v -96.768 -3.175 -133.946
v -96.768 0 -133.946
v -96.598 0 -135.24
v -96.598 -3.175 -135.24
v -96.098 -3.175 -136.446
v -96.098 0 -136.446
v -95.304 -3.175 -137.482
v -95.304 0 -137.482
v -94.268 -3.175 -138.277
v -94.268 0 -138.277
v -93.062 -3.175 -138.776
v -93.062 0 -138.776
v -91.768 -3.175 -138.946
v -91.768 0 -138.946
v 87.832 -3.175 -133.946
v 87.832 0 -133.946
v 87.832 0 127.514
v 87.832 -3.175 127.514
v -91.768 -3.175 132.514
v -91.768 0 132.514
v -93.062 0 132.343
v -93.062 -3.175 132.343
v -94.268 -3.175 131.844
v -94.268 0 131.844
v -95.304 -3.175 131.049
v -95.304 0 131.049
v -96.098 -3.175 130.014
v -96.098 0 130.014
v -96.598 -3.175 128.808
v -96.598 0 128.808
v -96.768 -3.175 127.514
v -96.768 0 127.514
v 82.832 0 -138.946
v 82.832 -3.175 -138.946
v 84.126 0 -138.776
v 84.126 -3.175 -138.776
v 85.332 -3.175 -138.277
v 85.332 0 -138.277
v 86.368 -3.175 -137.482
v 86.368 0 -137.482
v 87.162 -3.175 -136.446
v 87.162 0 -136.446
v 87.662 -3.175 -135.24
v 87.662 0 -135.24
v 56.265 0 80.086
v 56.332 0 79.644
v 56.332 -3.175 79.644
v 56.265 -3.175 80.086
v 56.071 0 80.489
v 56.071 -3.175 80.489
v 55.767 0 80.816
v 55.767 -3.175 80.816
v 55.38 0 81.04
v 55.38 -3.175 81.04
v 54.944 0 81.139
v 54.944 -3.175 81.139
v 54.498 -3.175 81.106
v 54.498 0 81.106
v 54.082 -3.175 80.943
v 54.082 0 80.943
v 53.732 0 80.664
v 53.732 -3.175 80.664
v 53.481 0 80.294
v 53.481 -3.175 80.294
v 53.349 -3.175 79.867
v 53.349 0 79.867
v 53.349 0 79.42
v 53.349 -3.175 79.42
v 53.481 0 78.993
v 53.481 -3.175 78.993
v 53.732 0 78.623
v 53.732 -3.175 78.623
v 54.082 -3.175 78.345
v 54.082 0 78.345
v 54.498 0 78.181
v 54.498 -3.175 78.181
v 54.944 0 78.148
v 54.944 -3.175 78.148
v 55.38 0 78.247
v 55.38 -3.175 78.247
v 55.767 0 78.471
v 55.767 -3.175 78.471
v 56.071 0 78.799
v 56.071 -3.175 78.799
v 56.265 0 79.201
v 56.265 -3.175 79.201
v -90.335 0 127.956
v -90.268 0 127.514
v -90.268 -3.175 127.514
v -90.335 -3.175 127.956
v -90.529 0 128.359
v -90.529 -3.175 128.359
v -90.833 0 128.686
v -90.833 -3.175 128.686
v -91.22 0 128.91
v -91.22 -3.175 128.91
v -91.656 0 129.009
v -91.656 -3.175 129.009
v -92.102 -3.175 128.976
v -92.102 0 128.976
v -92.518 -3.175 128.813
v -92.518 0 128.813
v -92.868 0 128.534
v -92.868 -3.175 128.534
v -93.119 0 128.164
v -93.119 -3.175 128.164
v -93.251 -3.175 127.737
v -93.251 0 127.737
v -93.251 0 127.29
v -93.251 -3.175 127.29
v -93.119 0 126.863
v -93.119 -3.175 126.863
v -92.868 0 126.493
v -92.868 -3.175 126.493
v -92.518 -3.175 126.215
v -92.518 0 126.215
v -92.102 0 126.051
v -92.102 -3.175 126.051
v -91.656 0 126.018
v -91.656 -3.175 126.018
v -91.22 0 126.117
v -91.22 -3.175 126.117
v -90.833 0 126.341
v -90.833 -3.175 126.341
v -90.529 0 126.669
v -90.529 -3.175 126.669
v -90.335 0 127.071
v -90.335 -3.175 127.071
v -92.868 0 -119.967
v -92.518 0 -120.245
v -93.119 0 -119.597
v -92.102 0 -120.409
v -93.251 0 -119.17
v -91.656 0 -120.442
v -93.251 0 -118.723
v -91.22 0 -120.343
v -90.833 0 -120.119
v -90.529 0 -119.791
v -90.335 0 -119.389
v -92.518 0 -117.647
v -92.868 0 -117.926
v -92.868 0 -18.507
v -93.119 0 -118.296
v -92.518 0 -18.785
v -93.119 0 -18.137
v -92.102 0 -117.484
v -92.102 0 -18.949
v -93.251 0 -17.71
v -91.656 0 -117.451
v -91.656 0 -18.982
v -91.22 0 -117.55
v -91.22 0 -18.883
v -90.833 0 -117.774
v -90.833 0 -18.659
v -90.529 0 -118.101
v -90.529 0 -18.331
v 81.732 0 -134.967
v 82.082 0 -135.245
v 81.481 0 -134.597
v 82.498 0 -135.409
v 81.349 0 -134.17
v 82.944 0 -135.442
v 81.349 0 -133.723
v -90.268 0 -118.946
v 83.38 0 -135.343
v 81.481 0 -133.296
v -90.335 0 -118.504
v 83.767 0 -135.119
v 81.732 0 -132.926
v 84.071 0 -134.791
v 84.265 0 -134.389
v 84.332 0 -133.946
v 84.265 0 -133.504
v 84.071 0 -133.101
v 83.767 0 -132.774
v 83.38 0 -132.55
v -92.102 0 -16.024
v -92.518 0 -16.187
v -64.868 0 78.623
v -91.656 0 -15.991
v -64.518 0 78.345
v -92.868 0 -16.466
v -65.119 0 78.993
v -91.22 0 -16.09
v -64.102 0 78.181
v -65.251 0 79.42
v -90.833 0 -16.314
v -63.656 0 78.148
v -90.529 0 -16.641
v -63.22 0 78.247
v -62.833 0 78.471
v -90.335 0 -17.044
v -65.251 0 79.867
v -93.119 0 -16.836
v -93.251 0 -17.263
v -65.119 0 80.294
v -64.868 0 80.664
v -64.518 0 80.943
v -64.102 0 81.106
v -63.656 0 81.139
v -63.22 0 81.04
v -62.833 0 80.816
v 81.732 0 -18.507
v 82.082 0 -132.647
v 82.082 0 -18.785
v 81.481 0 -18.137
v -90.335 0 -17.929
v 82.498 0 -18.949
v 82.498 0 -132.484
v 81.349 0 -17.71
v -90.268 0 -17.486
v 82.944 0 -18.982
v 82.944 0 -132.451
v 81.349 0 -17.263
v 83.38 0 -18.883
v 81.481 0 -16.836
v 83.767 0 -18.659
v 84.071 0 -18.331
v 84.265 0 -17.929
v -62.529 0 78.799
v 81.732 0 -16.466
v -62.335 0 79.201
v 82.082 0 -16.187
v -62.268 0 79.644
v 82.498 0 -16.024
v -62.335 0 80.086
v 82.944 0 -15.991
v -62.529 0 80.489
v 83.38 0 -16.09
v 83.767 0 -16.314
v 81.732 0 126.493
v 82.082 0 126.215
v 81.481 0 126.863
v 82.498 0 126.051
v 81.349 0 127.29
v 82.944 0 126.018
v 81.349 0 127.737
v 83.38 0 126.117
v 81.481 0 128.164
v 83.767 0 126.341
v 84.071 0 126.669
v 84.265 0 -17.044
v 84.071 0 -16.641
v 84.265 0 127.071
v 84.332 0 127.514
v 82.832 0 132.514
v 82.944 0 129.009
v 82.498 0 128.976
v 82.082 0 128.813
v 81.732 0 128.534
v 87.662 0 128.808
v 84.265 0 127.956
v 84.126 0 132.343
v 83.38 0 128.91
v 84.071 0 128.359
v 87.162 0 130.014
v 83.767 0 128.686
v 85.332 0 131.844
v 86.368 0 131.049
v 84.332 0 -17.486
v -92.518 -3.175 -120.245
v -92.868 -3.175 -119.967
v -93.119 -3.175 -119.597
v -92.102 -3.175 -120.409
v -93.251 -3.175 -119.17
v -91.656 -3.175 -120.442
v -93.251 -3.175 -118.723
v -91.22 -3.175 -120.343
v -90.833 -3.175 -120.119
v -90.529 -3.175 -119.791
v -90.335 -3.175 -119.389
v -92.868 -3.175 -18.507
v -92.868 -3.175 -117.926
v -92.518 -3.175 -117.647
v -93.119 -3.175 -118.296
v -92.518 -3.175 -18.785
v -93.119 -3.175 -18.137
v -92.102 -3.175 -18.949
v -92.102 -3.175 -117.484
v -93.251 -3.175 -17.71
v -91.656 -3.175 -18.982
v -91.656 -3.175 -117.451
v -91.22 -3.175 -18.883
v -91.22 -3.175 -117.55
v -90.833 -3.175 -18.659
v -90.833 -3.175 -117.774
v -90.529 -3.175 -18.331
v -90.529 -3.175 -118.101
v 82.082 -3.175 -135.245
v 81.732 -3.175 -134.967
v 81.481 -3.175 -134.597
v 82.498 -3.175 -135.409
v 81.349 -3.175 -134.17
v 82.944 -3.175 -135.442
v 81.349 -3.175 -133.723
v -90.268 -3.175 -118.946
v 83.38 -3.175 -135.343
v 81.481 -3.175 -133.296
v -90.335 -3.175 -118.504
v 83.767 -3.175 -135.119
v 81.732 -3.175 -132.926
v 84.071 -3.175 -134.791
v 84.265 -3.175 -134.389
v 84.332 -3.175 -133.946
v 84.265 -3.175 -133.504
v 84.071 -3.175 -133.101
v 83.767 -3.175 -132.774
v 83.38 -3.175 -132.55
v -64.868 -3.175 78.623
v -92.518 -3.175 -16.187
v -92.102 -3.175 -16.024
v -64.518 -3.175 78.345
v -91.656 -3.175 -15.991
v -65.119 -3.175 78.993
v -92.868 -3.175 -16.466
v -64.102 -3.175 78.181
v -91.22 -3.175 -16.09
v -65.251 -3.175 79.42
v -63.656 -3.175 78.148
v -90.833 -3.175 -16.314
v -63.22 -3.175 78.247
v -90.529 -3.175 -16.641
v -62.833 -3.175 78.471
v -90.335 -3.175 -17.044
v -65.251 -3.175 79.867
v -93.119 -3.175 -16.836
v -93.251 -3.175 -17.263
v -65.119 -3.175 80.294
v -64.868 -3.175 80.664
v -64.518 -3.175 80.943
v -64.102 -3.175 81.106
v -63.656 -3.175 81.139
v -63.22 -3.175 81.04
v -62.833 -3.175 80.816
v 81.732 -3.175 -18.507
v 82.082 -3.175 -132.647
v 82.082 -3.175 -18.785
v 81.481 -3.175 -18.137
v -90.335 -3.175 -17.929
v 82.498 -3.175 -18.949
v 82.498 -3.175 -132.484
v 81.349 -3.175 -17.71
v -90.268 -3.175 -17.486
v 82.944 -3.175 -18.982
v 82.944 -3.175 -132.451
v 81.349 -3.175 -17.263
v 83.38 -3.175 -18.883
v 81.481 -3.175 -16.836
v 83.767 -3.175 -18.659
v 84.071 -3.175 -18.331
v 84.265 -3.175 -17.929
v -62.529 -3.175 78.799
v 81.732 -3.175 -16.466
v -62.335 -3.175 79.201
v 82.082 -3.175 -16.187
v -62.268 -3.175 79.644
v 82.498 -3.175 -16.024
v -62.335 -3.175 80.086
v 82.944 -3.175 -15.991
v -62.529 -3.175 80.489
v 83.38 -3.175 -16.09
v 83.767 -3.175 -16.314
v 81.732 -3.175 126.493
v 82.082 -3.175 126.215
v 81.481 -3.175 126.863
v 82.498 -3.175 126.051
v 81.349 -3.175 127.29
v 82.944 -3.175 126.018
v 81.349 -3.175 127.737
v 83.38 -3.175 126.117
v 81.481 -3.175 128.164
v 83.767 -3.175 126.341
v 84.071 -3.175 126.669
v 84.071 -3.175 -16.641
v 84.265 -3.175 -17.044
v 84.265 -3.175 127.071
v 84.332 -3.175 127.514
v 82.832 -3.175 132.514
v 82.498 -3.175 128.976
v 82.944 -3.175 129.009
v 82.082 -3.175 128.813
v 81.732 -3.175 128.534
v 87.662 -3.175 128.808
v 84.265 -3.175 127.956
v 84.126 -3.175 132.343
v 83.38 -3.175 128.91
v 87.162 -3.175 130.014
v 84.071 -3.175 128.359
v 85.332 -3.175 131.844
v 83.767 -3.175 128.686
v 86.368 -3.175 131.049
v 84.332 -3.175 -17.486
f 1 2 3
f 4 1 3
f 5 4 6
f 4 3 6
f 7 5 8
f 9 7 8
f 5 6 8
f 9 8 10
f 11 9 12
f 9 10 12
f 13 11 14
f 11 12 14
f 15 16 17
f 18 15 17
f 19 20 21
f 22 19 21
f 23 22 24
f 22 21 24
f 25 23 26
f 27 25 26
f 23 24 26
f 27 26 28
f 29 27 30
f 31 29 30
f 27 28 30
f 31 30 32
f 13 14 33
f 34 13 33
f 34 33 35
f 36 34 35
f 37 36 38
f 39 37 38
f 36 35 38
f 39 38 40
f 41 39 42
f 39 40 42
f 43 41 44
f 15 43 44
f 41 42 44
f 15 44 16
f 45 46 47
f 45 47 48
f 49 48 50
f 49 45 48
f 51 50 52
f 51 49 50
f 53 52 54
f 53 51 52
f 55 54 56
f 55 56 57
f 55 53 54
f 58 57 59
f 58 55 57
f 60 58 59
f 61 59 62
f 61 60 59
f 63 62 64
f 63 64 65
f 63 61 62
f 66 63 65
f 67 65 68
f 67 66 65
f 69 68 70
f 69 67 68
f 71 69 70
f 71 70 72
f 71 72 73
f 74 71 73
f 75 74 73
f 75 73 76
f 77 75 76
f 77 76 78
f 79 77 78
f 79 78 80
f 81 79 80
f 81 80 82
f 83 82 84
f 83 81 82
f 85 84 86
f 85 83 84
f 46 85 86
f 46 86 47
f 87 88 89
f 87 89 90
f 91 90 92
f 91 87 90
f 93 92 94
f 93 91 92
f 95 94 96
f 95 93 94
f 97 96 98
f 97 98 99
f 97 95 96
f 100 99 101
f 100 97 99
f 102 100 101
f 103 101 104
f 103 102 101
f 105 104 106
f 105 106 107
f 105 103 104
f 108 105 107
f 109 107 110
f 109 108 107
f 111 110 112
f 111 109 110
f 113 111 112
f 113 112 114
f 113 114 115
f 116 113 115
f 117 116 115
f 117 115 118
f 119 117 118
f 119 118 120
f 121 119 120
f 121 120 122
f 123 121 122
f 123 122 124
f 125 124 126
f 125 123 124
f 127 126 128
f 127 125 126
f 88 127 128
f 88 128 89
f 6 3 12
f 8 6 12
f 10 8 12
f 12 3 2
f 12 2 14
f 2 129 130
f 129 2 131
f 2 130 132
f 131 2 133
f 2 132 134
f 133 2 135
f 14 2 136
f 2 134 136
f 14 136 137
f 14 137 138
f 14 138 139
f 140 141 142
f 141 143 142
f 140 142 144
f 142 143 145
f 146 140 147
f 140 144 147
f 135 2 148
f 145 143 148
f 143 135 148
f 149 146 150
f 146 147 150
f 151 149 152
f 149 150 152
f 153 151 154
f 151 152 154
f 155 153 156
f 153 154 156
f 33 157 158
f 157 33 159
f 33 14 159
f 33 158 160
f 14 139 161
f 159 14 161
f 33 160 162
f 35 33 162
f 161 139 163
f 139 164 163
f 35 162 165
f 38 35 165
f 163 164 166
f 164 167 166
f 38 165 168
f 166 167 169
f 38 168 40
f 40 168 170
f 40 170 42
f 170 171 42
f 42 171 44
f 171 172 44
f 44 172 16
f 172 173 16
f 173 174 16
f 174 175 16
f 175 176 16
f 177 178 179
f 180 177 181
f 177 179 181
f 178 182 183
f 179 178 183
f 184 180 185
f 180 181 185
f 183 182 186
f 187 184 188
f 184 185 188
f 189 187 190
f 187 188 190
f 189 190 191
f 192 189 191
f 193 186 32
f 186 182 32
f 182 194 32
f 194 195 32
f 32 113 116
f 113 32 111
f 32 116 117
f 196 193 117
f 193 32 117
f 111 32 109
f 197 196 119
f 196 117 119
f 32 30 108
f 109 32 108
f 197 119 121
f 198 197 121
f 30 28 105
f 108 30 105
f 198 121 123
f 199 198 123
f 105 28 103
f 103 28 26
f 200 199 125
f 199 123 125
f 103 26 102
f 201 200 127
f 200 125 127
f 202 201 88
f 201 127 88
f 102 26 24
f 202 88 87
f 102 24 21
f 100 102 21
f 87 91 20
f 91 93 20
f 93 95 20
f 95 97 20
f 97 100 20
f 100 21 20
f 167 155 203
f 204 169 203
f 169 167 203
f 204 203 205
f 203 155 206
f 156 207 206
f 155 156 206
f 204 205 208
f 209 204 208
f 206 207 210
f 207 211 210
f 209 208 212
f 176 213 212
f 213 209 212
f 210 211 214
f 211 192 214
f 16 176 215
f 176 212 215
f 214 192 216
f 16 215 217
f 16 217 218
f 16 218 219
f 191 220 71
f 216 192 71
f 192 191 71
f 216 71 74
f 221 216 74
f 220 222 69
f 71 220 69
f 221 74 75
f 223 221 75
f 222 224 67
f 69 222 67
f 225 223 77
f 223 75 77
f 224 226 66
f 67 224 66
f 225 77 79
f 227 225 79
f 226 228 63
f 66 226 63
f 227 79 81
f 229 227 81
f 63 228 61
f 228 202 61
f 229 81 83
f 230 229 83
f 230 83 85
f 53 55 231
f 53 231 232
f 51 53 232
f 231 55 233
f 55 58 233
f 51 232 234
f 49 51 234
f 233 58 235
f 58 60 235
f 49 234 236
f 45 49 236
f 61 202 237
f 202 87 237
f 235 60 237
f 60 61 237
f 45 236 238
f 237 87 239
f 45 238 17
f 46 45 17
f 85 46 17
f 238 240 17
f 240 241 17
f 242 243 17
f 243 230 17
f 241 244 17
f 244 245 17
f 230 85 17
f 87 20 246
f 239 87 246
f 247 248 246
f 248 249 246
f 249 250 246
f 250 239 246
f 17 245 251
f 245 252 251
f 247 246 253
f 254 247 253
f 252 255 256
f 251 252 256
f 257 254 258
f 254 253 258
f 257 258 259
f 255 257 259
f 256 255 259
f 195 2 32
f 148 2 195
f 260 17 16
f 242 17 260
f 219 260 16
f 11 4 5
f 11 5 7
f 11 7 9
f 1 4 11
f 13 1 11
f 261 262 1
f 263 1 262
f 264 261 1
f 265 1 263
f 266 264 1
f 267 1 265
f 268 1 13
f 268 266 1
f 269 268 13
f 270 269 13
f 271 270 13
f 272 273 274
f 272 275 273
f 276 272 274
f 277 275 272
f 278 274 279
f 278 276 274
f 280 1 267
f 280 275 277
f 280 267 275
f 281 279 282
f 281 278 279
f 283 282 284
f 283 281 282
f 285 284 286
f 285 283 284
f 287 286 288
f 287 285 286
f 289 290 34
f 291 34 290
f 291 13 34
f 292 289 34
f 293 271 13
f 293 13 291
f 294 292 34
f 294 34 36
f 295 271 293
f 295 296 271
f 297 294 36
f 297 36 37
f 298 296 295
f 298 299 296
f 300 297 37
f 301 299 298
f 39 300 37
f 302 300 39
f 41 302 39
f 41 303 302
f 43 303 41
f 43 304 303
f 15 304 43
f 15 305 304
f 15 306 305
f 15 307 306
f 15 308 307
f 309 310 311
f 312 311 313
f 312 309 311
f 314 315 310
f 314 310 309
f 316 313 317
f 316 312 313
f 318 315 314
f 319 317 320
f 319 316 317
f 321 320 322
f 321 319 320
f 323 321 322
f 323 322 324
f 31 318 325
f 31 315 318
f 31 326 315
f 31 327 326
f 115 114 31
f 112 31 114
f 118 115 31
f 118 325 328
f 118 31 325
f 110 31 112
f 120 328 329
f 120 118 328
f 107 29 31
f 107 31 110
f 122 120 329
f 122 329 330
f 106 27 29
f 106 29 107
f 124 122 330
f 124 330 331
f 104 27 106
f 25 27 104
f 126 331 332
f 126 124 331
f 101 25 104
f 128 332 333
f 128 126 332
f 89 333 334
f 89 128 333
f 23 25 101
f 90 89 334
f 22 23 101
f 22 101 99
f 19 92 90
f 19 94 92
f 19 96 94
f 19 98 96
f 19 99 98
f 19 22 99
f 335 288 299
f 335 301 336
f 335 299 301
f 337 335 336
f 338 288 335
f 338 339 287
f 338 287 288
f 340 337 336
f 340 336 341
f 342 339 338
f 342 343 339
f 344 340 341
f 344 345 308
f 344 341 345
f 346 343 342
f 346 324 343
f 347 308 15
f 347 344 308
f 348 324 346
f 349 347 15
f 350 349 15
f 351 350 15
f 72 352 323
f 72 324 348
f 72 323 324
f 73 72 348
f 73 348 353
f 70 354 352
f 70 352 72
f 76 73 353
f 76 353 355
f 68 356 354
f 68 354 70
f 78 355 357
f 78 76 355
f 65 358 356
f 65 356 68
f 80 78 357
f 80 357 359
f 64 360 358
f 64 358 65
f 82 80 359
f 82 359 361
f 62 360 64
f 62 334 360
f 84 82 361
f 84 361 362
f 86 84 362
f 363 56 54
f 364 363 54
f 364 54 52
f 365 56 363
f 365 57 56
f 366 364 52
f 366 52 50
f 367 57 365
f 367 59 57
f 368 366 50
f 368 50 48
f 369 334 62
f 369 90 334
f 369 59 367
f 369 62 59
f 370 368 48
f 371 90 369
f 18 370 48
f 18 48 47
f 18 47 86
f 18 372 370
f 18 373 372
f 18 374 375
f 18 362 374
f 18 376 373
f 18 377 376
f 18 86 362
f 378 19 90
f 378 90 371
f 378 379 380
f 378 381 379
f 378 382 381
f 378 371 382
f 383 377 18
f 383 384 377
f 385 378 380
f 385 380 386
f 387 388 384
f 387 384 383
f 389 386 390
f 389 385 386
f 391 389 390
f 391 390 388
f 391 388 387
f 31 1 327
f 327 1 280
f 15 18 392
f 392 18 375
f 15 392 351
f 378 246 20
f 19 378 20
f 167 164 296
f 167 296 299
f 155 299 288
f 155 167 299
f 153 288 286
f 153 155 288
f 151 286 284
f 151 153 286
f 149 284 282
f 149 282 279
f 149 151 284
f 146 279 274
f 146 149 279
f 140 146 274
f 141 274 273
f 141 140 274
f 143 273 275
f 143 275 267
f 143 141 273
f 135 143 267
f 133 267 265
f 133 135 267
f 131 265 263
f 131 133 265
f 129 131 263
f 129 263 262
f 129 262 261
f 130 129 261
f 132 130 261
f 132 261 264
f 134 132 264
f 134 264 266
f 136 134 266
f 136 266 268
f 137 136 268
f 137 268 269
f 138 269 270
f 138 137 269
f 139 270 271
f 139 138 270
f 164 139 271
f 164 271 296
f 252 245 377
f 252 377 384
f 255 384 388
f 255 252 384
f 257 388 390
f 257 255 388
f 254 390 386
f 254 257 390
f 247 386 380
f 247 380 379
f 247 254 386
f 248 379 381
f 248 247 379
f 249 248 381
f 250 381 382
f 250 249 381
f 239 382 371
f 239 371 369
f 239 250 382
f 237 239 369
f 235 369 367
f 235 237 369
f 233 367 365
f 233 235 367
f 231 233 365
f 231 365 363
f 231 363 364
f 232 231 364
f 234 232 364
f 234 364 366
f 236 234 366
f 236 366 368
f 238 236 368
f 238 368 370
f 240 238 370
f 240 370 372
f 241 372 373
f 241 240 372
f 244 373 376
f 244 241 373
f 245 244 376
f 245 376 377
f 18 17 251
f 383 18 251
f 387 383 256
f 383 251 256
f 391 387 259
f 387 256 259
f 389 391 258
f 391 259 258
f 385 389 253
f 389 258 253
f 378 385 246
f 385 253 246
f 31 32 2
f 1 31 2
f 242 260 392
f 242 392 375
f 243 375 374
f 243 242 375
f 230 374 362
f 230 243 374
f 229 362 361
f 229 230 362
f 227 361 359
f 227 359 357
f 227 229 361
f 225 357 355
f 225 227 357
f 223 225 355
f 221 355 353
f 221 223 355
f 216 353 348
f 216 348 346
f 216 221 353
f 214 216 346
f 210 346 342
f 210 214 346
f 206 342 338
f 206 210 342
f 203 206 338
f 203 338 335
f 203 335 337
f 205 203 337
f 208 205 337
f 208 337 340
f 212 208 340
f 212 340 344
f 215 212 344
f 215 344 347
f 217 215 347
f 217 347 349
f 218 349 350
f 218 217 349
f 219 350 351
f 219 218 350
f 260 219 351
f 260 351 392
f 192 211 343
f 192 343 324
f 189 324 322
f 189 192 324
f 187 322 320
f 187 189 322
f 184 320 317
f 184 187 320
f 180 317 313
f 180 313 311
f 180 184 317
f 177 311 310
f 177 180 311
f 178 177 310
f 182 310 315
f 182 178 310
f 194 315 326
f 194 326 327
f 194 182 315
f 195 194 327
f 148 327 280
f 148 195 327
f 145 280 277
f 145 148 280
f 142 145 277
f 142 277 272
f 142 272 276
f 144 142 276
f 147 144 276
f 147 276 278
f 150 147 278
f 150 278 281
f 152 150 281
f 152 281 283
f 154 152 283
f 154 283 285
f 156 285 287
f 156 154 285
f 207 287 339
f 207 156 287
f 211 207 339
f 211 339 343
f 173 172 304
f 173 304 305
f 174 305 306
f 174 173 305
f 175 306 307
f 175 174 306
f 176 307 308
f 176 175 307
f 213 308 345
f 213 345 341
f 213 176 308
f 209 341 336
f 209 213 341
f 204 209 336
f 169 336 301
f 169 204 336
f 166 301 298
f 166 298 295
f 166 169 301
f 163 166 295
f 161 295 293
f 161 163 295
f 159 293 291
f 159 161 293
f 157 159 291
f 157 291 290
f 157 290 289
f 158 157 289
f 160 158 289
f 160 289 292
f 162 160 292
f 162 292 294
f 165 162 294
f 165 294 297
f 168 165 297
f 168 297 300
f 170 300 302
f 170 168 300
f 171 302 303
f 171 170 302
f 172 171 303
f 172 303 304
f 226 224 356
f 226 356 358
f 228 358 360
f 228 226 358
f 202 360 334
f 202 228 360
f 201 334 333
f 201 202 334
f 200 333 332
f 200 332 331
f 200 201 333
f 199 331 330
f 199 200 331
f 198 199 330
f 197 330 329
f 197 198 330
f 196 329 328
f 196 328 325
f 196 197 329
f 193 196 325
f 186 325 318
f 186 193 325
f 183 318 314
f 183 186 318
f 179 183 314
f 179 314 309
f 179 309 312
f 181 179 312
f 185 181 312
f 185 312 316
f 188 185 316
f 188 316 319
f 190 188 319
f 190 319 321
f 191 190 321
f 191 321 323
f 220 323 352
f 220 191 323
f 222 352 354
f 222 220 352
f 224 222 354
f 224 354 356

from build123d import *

# Parameters (mm, degrees)
F0_R     = 1.5
F0_W     = 30
F0_H     = 6.7
F0_W_2   = 10
F0_H_2   = 91.46
F0_H_3   = 15
F0_W_3   = 164.6
F0_H_4   = 2.834
F0_H_5   = 5.5
F0_W_4   = 70
F0_H_6   = 1.7
F0_H_7   = 1.48
F0_H_8   = 5
F0_W_5   = 3
F0_H_9   = 1.4
F0_H_10  = 0.6
F1_DEPTH = 3.175


# Not quite as in the source:
# - a feature names something its author has since deleted; it is built from what else it names


with BuildPart() as f1:
    # F0 (on Front) → F1 (new body)
    with BuildSketch(Plane.XZ):
        with BuildLine():
            Line((-18.7680281997, 132.5136111658), (-91.7680281997, 132.5136111658))
            ThreePointArc((-91.7680281997, 132.5136111658), (-95.3035621056, 131.0491450717), (-96.7680281997, 127.5136111658))
            Line((-96.7680281997, 127.5136111658), (-96.7680281997, -22.4863888342))
            Line((-96.7680281997, -22.4863888342), (-86.7680281997, -22.4863888342))
            Line((-86.7680281997, -22.4863888342), (-86.7680281997, 13.1196111658))
            Line((-86.7680281997, 13.1196111658), (-86.7680281997, 15.9536111658))
            Line((-86.7680281997, 15.9536111658), (-86.7680281997, 21.4536111658))
            Line((-86.7680281997, 21.4536111658), (-89.7680281997, 21.4536111658))
            Line((-89.7680281997, 21.4536111658), (-89.7680281997, 22.0536111658))
            Line((-89.7680281997, 22.0536111658), (-89.7680281997, 22.8536111658))
            Line((-89.7680281997, 22.8536111658), (-89.7680281997, 23.4536111658))
            Line((-89.7680281997, 23.4536111658), (-86.7680281997, 23.4536111658))
            Line((-86.7680281997, 23.4536111658), (-86.7680281997, 24.6436111658))
            Line((-86.7680281997, 24.6436111658), (-86.7680281997, 53.4536111658))
            Line((-86.7680281997, 53.4536111658), (-86.7680281997, 60.9536111658))
            Line((-86.7680281997, 60.9536111658), (-86.7680281997, 64.0936111658))
            Line((-86.7680281997, 64.0936111658), (-86.7680281997, 122.5136111658))
            Line((-86.7680281997, 122.5136111658), (-40.4680281997, 122.5136111658))
            Line((-40.4680281997, 122.5136111658), (-39.4680281997, 122.5136111658))
            Line((-39.4680281997, 122.5136111658), (-39.4680281997, 124.2136111658))
            Line((-39.4680281997, 124.2136111658), (-49.4680281997, 124.2136111658))
            Line((-49.4680281997, 124.2136111658), (-49.4680281997, 125.8136111658))
            Line((-49.4680281997, 125.8136111658), (-28.7680281997, 125.8136111658))
            Line((-28.7680281997, 125.8136111658), (-18.7680281997, 125.8136111658))
            Line((-18.7680281997, 125.8136111658), (-18.7680281997, 132.5136111658))
        make_face()
        with Locations((-91.7680281997, -17.4863888342)):
            Circle(F0_R, mode=Mode.SUBTRACT)
        with Locations((-91.7680281997, 127.5136111658)):
            Circle(F0_R, mode=Mode.SUBTRACT)
        with Locations((-3.7680281997, 129.1636111658)):
            Rectangle(F0_W, F0_H)
        with BuildLine():
            Line((82.8319718003, 132.5136111658), (11.2319718003, 132.5136111658))
            Line((11.2319718003, 132.5136111658), (11.2319718003, 125.8136111658))
            Line((11.2319718003, 125.8136111658), (21.2319718003, 125.8136111658))
            Line((21.2319718003, 125.8136111658), (40.5319718003, 125.8136111658))
            Line((40.5319718003, 125.8136111658), (40.5319718003, 124.2136111658))
            Line((40.5319718003, 124.2136111658), (30.5319718003, 124.2136111658))
            Line((30.5319718003, 124.2136111658), (30.5319718003, 122.5136111658))
            Line((30.5319718003, 122.5136111658), (40.5319718003, 122.5136111658))
            Line((40.5319718003, 122.5136111658), (77.8319718003, 122.5136111658))
            Line((77.8319718003, 122.5136111658), (77.8319718003, 64.0936111658))
            Line((77.8319718003, 64.0936111658), (77.8319718003, 60.9536111658))
            Line((77.8319718003, 60.9536111658), (77.8319718003, 53.4536111658))
            Line((77.8319718003, 53.4536111658), (77.8319718003, 24.6436111658))
            Line((77.8319718003, 24.6436111658), (77.8319718003, 23.4536111658))
            Line((77.8319718003, 23.4536111658), (80.8319718003, 23.4536111658))
            Line((80.8319718003, 23.4536111658), (80.8319718003, 22.8536111658))
            Line((80.8319718003, 22.8536111658), (80.8319718003, 21.4536111658))
            Line((80.8319718003, 21.4536111658), (77.8319718003, 21.4536111658))
            Line((77.8319718003, 21.4536111658), (77.8319718003, 15.9536111658))
            Line((77.8319718003, 15.9536111658), (77.8319718003, 13.1196111658))
            Line((77.8319718003, 13.1196111658), (77.8319718003, -128.9463888342))
            Line((77.8319718003, -128.9463888342), (1.2319718003, -128.9463888342))
            Line((1.2319718003, -128.9463888342), (1.2319718003, -130.4263888342))
            Line((1.2319718003, -130.4263888342), (3.7319718003, -130.4263888342))
            Line((3.7319718003, -130.4263888342), (3.7319718003, -132.0263888342))
            Line((3.7319718003, -132.0263888342), (-11.2680281997, -132.0263888342))
            Line((-11.2680281997, -132.0263888342), (-11.2680281997, -130.4263888342))
            Line((-11.2680281997, -130.4263888342), (-8.7680281997, -130.4263888342))
            Line((-8.7680281997, -130.4263888342), (-8.7680281997, -128.9463888342))
            Line((-8.7680281997, -128.9463888342), (-86.7680281997, -128.9463888342))
            Line((-86.7680281997, -128.9463888342), (-96.7680281997, -128.9463888342))
            Line((-96.7680281997, -128.9463888342), (-96.7680281997, -132.2803888342))
            Line((-96.7680281997, -132.2803888342), (-96.7680281997, -133.9463888342))
            ThreePointArc((-96.7680281997, -133.9463888342), (-95.3035621056, -137.4819227401), (-91.7680281997, -138.9463888342))
            Line((-91.7680281997, -138.9463888342), (82.8319718003, -138.9463888342))
            ThreePointArc((82.8319718003, -138.9463888342), (86.3675057063, -137.4819227401), (87.8319718003, -133.9463888342))
            Line((87.8319718003, -133.9463888342), (87.8319718003, 127.5136111658))
            ThreePointArc((87.8319718003, 127.5136111658), (86.3675057063, 131.0491450717), (82.8319718003, 132.5136111658))
        make_face()
        with Locations((82.8319718003, -133.9463888342)):
            Circle(F0_R, mode=Mode.SUBTRACT)
        with Locations((82.8319718003, -17.4863888342)):
            Circle(F0_R, mode=Mode.SUBTRACT)
        with Locations((82.8319718003, 127.5136111658)):
            Circle(F0_R, mode=Mode.SUBTRACT)
        Polygon((11.2319718003, 125.8136111658), (-18.7680281997, 125.8136111658), (-28.7680281997, 125.8136111658), (-49.4680281997, 125.8136111658), (-49.4680281997, 124.2136111658), (-39.4680281997, 124.2136111658), (30.5319718003, 124.2136111658), (40.5319718003, 124.2136111658), (40.5319718003, 125.8136111658), (21.2319718003, 125.8136111658), align=None)
        with Locations((-91.7680281997, -68.2163888342)):
            Rectangle(F0_W_2, F0_H_2)
        with Locations((-91.7680281997, -121.4463888342)):
            Rectangle(F0_W_2, F0_H_3)
        with Locations((-91.7680281997, -118.9463888342)):
            Circle(F0_R, mode=Mode.SUBTRACT)
        Polygon((-86.7680281997, 13.1196111658), (-86.7680281997, -22.4863888342), (-86.7680281997, -113.9463888342), (-86.7680281997, -128.9463888342), (-8.7680281997, -128.9463888342), (1.2319718003, -128.9463888342), (77.8319718003, -128.9463888342), (77.8319718003, 13.1196111658), align=None)
        with Locations((-4.4680281997, 14.5366111658)):
            Rectangle(F0_W_3, F0_H_4)
        with Locations((-4.4680281997, 18.7036111658)):
            Rectangle(F0_W_3, F0_H_5)
        with Locations((-4.4680281997, 123.3636111658)):
            Rectangle(F0_W_4, F0_H_6)
        with Locations((-3.7680281997, -129.6863888342)):
            Rectangle(F0_W_2, F0_H_7)
        Polygon((-89.7680281997, 21.4536111658), (-86.7680281997, 21.4536111658), (-86.7680281997, 22.0536111658), (-86.7680281997, 22.8536111658), (-89.7680281997, 22.8536111658), (-89.7680281997, 22.0536111658), align=None)
        Polygon((-86.7680281997, 22.0536111658), (-86.7680281997, 21.4536111658), (77.8319718003, 21.4536111658), (77.8319718003, 22.8536111658), (77.8319718003, 23.4536111658), (-86.7680281997, 23.4536111658), (-86.7680281997, 22.8536111658), align=None)
        Polygon((-39.4680281997, 117.5136111658), (-39.4680281997, 122.5136111658), (-40.4680281997, 122.5136111658), (-86.7680281997, 122.5136111658), (-86.7680281997, 64.0936111658), (-66.675587153, 64.0936111658), align=None)
        with Locations((-63.7680281997, 79.6436111658)):
            Circle(F0_R, mode=Mode.SUBTRACT)
        with Locations((-4.4680281997, 120.0136111658)):
            Rectangle(F0_W_4, F0_H_8)
        Polygon((1.2319718003, -130.4263888342), (-8.7680281997, -130.4263888342), (-11.2680281997, -130.4263888342), (-11.2680281997, -132.0263888342), (3.7319718003, -132.0263888342), (3.7319718003, -130.4263888342), align=None)
        with Locations((79.3319718003, 22.1536111658)):
            Rectangle(F0_W_5, F0_H_9)
        Polygon((40.5319718003, 122.5136111658), (30.5319718003, 122.5136111658), (30.5319718003, 117.5136111658), (57.7395307537, 64.0936111658), (77.8319718003, 64.0936111658), (77.8319718003, 122.5136111658), align=None)
        with Locations((54.8319718003, 79.6436111658)):
            Circle(F0_R, mode=Mode.SUBTRACT)
        Polygon((30.5319718003, 117.5136111658), (-39.4680281997, 117.5136111658), (-66.675587153, 64.0936111658), (57.7395307537, 64.0936111658), align=None)
        with Locations((-88.2680281997, 23.1536111658)):
            Rectangle(F0_W_5, F0_H_10)
        with Locations((79.3319718003, 23.1536111658)):
            Rectangle(F0_W_5, F0_H_10)
        Polygon((57.7395307537, 64.0936111658), (-66.675587153, 64.0936111658), (-68.2748334113, 60.9536111658), (59.3387770119, 60.9536111658), align=None)
        Polygon((-68.2748334113, 60.9536111658), (-66.675587153, 64.0936111658), (-86.7680281997, 64.0936111658), (-86.7680281997, 60.9536111658), align=None)
        Polygon((-86.7680281997, 24.6436111658), (-86.7680281997, 23.4536111658), (77.8319718003, 23.4536111658), (77.8319718003, 24.6436111658), (63.1586327242, 53.4536111658), (-72.0946891235, 53.4536111658), align=None)
        Polygon((77.8319718003, 64.0936111658), (57.7395307537, 64.0936111658), (59.3387770119, 60.9536111658), (77.8319718003, 60.9536111658), align=None)
        Polygon((59.3387770119, 60.9536111658), (-68.2748334113, 60.9536111658), (-72.0946891235, 53.4536111658), (63.1586327242, 53.4536111658), align=None)
        Polygon((-72.0946891235, 53.4536111658), (-68.2748334113, 60.9536111658), (-86.7680281997, 60.9536111658), (-86.7680281997, 53.4536111658), align=None)
        Polygon((-86.7680281997, 53.4536111658), (-86.7680281997, 24.6436111658), (-72.0946891235, 53.4536111658), align=None)
        Polygon((63.1586327242, 53.4536111658), (77.8319718003, 24.6436111658), (77.8319718003, 53.4536111658), align=None)
        Polygon((77.8319718003, 60.9536111658), (59.3387770119, 60.9536111658), (63.1586327242, 53.4536111658), (77.8319718003, 53.4536111658), align=None)
    extrude(amount=F1_DEPTH)


solid = f1.part
